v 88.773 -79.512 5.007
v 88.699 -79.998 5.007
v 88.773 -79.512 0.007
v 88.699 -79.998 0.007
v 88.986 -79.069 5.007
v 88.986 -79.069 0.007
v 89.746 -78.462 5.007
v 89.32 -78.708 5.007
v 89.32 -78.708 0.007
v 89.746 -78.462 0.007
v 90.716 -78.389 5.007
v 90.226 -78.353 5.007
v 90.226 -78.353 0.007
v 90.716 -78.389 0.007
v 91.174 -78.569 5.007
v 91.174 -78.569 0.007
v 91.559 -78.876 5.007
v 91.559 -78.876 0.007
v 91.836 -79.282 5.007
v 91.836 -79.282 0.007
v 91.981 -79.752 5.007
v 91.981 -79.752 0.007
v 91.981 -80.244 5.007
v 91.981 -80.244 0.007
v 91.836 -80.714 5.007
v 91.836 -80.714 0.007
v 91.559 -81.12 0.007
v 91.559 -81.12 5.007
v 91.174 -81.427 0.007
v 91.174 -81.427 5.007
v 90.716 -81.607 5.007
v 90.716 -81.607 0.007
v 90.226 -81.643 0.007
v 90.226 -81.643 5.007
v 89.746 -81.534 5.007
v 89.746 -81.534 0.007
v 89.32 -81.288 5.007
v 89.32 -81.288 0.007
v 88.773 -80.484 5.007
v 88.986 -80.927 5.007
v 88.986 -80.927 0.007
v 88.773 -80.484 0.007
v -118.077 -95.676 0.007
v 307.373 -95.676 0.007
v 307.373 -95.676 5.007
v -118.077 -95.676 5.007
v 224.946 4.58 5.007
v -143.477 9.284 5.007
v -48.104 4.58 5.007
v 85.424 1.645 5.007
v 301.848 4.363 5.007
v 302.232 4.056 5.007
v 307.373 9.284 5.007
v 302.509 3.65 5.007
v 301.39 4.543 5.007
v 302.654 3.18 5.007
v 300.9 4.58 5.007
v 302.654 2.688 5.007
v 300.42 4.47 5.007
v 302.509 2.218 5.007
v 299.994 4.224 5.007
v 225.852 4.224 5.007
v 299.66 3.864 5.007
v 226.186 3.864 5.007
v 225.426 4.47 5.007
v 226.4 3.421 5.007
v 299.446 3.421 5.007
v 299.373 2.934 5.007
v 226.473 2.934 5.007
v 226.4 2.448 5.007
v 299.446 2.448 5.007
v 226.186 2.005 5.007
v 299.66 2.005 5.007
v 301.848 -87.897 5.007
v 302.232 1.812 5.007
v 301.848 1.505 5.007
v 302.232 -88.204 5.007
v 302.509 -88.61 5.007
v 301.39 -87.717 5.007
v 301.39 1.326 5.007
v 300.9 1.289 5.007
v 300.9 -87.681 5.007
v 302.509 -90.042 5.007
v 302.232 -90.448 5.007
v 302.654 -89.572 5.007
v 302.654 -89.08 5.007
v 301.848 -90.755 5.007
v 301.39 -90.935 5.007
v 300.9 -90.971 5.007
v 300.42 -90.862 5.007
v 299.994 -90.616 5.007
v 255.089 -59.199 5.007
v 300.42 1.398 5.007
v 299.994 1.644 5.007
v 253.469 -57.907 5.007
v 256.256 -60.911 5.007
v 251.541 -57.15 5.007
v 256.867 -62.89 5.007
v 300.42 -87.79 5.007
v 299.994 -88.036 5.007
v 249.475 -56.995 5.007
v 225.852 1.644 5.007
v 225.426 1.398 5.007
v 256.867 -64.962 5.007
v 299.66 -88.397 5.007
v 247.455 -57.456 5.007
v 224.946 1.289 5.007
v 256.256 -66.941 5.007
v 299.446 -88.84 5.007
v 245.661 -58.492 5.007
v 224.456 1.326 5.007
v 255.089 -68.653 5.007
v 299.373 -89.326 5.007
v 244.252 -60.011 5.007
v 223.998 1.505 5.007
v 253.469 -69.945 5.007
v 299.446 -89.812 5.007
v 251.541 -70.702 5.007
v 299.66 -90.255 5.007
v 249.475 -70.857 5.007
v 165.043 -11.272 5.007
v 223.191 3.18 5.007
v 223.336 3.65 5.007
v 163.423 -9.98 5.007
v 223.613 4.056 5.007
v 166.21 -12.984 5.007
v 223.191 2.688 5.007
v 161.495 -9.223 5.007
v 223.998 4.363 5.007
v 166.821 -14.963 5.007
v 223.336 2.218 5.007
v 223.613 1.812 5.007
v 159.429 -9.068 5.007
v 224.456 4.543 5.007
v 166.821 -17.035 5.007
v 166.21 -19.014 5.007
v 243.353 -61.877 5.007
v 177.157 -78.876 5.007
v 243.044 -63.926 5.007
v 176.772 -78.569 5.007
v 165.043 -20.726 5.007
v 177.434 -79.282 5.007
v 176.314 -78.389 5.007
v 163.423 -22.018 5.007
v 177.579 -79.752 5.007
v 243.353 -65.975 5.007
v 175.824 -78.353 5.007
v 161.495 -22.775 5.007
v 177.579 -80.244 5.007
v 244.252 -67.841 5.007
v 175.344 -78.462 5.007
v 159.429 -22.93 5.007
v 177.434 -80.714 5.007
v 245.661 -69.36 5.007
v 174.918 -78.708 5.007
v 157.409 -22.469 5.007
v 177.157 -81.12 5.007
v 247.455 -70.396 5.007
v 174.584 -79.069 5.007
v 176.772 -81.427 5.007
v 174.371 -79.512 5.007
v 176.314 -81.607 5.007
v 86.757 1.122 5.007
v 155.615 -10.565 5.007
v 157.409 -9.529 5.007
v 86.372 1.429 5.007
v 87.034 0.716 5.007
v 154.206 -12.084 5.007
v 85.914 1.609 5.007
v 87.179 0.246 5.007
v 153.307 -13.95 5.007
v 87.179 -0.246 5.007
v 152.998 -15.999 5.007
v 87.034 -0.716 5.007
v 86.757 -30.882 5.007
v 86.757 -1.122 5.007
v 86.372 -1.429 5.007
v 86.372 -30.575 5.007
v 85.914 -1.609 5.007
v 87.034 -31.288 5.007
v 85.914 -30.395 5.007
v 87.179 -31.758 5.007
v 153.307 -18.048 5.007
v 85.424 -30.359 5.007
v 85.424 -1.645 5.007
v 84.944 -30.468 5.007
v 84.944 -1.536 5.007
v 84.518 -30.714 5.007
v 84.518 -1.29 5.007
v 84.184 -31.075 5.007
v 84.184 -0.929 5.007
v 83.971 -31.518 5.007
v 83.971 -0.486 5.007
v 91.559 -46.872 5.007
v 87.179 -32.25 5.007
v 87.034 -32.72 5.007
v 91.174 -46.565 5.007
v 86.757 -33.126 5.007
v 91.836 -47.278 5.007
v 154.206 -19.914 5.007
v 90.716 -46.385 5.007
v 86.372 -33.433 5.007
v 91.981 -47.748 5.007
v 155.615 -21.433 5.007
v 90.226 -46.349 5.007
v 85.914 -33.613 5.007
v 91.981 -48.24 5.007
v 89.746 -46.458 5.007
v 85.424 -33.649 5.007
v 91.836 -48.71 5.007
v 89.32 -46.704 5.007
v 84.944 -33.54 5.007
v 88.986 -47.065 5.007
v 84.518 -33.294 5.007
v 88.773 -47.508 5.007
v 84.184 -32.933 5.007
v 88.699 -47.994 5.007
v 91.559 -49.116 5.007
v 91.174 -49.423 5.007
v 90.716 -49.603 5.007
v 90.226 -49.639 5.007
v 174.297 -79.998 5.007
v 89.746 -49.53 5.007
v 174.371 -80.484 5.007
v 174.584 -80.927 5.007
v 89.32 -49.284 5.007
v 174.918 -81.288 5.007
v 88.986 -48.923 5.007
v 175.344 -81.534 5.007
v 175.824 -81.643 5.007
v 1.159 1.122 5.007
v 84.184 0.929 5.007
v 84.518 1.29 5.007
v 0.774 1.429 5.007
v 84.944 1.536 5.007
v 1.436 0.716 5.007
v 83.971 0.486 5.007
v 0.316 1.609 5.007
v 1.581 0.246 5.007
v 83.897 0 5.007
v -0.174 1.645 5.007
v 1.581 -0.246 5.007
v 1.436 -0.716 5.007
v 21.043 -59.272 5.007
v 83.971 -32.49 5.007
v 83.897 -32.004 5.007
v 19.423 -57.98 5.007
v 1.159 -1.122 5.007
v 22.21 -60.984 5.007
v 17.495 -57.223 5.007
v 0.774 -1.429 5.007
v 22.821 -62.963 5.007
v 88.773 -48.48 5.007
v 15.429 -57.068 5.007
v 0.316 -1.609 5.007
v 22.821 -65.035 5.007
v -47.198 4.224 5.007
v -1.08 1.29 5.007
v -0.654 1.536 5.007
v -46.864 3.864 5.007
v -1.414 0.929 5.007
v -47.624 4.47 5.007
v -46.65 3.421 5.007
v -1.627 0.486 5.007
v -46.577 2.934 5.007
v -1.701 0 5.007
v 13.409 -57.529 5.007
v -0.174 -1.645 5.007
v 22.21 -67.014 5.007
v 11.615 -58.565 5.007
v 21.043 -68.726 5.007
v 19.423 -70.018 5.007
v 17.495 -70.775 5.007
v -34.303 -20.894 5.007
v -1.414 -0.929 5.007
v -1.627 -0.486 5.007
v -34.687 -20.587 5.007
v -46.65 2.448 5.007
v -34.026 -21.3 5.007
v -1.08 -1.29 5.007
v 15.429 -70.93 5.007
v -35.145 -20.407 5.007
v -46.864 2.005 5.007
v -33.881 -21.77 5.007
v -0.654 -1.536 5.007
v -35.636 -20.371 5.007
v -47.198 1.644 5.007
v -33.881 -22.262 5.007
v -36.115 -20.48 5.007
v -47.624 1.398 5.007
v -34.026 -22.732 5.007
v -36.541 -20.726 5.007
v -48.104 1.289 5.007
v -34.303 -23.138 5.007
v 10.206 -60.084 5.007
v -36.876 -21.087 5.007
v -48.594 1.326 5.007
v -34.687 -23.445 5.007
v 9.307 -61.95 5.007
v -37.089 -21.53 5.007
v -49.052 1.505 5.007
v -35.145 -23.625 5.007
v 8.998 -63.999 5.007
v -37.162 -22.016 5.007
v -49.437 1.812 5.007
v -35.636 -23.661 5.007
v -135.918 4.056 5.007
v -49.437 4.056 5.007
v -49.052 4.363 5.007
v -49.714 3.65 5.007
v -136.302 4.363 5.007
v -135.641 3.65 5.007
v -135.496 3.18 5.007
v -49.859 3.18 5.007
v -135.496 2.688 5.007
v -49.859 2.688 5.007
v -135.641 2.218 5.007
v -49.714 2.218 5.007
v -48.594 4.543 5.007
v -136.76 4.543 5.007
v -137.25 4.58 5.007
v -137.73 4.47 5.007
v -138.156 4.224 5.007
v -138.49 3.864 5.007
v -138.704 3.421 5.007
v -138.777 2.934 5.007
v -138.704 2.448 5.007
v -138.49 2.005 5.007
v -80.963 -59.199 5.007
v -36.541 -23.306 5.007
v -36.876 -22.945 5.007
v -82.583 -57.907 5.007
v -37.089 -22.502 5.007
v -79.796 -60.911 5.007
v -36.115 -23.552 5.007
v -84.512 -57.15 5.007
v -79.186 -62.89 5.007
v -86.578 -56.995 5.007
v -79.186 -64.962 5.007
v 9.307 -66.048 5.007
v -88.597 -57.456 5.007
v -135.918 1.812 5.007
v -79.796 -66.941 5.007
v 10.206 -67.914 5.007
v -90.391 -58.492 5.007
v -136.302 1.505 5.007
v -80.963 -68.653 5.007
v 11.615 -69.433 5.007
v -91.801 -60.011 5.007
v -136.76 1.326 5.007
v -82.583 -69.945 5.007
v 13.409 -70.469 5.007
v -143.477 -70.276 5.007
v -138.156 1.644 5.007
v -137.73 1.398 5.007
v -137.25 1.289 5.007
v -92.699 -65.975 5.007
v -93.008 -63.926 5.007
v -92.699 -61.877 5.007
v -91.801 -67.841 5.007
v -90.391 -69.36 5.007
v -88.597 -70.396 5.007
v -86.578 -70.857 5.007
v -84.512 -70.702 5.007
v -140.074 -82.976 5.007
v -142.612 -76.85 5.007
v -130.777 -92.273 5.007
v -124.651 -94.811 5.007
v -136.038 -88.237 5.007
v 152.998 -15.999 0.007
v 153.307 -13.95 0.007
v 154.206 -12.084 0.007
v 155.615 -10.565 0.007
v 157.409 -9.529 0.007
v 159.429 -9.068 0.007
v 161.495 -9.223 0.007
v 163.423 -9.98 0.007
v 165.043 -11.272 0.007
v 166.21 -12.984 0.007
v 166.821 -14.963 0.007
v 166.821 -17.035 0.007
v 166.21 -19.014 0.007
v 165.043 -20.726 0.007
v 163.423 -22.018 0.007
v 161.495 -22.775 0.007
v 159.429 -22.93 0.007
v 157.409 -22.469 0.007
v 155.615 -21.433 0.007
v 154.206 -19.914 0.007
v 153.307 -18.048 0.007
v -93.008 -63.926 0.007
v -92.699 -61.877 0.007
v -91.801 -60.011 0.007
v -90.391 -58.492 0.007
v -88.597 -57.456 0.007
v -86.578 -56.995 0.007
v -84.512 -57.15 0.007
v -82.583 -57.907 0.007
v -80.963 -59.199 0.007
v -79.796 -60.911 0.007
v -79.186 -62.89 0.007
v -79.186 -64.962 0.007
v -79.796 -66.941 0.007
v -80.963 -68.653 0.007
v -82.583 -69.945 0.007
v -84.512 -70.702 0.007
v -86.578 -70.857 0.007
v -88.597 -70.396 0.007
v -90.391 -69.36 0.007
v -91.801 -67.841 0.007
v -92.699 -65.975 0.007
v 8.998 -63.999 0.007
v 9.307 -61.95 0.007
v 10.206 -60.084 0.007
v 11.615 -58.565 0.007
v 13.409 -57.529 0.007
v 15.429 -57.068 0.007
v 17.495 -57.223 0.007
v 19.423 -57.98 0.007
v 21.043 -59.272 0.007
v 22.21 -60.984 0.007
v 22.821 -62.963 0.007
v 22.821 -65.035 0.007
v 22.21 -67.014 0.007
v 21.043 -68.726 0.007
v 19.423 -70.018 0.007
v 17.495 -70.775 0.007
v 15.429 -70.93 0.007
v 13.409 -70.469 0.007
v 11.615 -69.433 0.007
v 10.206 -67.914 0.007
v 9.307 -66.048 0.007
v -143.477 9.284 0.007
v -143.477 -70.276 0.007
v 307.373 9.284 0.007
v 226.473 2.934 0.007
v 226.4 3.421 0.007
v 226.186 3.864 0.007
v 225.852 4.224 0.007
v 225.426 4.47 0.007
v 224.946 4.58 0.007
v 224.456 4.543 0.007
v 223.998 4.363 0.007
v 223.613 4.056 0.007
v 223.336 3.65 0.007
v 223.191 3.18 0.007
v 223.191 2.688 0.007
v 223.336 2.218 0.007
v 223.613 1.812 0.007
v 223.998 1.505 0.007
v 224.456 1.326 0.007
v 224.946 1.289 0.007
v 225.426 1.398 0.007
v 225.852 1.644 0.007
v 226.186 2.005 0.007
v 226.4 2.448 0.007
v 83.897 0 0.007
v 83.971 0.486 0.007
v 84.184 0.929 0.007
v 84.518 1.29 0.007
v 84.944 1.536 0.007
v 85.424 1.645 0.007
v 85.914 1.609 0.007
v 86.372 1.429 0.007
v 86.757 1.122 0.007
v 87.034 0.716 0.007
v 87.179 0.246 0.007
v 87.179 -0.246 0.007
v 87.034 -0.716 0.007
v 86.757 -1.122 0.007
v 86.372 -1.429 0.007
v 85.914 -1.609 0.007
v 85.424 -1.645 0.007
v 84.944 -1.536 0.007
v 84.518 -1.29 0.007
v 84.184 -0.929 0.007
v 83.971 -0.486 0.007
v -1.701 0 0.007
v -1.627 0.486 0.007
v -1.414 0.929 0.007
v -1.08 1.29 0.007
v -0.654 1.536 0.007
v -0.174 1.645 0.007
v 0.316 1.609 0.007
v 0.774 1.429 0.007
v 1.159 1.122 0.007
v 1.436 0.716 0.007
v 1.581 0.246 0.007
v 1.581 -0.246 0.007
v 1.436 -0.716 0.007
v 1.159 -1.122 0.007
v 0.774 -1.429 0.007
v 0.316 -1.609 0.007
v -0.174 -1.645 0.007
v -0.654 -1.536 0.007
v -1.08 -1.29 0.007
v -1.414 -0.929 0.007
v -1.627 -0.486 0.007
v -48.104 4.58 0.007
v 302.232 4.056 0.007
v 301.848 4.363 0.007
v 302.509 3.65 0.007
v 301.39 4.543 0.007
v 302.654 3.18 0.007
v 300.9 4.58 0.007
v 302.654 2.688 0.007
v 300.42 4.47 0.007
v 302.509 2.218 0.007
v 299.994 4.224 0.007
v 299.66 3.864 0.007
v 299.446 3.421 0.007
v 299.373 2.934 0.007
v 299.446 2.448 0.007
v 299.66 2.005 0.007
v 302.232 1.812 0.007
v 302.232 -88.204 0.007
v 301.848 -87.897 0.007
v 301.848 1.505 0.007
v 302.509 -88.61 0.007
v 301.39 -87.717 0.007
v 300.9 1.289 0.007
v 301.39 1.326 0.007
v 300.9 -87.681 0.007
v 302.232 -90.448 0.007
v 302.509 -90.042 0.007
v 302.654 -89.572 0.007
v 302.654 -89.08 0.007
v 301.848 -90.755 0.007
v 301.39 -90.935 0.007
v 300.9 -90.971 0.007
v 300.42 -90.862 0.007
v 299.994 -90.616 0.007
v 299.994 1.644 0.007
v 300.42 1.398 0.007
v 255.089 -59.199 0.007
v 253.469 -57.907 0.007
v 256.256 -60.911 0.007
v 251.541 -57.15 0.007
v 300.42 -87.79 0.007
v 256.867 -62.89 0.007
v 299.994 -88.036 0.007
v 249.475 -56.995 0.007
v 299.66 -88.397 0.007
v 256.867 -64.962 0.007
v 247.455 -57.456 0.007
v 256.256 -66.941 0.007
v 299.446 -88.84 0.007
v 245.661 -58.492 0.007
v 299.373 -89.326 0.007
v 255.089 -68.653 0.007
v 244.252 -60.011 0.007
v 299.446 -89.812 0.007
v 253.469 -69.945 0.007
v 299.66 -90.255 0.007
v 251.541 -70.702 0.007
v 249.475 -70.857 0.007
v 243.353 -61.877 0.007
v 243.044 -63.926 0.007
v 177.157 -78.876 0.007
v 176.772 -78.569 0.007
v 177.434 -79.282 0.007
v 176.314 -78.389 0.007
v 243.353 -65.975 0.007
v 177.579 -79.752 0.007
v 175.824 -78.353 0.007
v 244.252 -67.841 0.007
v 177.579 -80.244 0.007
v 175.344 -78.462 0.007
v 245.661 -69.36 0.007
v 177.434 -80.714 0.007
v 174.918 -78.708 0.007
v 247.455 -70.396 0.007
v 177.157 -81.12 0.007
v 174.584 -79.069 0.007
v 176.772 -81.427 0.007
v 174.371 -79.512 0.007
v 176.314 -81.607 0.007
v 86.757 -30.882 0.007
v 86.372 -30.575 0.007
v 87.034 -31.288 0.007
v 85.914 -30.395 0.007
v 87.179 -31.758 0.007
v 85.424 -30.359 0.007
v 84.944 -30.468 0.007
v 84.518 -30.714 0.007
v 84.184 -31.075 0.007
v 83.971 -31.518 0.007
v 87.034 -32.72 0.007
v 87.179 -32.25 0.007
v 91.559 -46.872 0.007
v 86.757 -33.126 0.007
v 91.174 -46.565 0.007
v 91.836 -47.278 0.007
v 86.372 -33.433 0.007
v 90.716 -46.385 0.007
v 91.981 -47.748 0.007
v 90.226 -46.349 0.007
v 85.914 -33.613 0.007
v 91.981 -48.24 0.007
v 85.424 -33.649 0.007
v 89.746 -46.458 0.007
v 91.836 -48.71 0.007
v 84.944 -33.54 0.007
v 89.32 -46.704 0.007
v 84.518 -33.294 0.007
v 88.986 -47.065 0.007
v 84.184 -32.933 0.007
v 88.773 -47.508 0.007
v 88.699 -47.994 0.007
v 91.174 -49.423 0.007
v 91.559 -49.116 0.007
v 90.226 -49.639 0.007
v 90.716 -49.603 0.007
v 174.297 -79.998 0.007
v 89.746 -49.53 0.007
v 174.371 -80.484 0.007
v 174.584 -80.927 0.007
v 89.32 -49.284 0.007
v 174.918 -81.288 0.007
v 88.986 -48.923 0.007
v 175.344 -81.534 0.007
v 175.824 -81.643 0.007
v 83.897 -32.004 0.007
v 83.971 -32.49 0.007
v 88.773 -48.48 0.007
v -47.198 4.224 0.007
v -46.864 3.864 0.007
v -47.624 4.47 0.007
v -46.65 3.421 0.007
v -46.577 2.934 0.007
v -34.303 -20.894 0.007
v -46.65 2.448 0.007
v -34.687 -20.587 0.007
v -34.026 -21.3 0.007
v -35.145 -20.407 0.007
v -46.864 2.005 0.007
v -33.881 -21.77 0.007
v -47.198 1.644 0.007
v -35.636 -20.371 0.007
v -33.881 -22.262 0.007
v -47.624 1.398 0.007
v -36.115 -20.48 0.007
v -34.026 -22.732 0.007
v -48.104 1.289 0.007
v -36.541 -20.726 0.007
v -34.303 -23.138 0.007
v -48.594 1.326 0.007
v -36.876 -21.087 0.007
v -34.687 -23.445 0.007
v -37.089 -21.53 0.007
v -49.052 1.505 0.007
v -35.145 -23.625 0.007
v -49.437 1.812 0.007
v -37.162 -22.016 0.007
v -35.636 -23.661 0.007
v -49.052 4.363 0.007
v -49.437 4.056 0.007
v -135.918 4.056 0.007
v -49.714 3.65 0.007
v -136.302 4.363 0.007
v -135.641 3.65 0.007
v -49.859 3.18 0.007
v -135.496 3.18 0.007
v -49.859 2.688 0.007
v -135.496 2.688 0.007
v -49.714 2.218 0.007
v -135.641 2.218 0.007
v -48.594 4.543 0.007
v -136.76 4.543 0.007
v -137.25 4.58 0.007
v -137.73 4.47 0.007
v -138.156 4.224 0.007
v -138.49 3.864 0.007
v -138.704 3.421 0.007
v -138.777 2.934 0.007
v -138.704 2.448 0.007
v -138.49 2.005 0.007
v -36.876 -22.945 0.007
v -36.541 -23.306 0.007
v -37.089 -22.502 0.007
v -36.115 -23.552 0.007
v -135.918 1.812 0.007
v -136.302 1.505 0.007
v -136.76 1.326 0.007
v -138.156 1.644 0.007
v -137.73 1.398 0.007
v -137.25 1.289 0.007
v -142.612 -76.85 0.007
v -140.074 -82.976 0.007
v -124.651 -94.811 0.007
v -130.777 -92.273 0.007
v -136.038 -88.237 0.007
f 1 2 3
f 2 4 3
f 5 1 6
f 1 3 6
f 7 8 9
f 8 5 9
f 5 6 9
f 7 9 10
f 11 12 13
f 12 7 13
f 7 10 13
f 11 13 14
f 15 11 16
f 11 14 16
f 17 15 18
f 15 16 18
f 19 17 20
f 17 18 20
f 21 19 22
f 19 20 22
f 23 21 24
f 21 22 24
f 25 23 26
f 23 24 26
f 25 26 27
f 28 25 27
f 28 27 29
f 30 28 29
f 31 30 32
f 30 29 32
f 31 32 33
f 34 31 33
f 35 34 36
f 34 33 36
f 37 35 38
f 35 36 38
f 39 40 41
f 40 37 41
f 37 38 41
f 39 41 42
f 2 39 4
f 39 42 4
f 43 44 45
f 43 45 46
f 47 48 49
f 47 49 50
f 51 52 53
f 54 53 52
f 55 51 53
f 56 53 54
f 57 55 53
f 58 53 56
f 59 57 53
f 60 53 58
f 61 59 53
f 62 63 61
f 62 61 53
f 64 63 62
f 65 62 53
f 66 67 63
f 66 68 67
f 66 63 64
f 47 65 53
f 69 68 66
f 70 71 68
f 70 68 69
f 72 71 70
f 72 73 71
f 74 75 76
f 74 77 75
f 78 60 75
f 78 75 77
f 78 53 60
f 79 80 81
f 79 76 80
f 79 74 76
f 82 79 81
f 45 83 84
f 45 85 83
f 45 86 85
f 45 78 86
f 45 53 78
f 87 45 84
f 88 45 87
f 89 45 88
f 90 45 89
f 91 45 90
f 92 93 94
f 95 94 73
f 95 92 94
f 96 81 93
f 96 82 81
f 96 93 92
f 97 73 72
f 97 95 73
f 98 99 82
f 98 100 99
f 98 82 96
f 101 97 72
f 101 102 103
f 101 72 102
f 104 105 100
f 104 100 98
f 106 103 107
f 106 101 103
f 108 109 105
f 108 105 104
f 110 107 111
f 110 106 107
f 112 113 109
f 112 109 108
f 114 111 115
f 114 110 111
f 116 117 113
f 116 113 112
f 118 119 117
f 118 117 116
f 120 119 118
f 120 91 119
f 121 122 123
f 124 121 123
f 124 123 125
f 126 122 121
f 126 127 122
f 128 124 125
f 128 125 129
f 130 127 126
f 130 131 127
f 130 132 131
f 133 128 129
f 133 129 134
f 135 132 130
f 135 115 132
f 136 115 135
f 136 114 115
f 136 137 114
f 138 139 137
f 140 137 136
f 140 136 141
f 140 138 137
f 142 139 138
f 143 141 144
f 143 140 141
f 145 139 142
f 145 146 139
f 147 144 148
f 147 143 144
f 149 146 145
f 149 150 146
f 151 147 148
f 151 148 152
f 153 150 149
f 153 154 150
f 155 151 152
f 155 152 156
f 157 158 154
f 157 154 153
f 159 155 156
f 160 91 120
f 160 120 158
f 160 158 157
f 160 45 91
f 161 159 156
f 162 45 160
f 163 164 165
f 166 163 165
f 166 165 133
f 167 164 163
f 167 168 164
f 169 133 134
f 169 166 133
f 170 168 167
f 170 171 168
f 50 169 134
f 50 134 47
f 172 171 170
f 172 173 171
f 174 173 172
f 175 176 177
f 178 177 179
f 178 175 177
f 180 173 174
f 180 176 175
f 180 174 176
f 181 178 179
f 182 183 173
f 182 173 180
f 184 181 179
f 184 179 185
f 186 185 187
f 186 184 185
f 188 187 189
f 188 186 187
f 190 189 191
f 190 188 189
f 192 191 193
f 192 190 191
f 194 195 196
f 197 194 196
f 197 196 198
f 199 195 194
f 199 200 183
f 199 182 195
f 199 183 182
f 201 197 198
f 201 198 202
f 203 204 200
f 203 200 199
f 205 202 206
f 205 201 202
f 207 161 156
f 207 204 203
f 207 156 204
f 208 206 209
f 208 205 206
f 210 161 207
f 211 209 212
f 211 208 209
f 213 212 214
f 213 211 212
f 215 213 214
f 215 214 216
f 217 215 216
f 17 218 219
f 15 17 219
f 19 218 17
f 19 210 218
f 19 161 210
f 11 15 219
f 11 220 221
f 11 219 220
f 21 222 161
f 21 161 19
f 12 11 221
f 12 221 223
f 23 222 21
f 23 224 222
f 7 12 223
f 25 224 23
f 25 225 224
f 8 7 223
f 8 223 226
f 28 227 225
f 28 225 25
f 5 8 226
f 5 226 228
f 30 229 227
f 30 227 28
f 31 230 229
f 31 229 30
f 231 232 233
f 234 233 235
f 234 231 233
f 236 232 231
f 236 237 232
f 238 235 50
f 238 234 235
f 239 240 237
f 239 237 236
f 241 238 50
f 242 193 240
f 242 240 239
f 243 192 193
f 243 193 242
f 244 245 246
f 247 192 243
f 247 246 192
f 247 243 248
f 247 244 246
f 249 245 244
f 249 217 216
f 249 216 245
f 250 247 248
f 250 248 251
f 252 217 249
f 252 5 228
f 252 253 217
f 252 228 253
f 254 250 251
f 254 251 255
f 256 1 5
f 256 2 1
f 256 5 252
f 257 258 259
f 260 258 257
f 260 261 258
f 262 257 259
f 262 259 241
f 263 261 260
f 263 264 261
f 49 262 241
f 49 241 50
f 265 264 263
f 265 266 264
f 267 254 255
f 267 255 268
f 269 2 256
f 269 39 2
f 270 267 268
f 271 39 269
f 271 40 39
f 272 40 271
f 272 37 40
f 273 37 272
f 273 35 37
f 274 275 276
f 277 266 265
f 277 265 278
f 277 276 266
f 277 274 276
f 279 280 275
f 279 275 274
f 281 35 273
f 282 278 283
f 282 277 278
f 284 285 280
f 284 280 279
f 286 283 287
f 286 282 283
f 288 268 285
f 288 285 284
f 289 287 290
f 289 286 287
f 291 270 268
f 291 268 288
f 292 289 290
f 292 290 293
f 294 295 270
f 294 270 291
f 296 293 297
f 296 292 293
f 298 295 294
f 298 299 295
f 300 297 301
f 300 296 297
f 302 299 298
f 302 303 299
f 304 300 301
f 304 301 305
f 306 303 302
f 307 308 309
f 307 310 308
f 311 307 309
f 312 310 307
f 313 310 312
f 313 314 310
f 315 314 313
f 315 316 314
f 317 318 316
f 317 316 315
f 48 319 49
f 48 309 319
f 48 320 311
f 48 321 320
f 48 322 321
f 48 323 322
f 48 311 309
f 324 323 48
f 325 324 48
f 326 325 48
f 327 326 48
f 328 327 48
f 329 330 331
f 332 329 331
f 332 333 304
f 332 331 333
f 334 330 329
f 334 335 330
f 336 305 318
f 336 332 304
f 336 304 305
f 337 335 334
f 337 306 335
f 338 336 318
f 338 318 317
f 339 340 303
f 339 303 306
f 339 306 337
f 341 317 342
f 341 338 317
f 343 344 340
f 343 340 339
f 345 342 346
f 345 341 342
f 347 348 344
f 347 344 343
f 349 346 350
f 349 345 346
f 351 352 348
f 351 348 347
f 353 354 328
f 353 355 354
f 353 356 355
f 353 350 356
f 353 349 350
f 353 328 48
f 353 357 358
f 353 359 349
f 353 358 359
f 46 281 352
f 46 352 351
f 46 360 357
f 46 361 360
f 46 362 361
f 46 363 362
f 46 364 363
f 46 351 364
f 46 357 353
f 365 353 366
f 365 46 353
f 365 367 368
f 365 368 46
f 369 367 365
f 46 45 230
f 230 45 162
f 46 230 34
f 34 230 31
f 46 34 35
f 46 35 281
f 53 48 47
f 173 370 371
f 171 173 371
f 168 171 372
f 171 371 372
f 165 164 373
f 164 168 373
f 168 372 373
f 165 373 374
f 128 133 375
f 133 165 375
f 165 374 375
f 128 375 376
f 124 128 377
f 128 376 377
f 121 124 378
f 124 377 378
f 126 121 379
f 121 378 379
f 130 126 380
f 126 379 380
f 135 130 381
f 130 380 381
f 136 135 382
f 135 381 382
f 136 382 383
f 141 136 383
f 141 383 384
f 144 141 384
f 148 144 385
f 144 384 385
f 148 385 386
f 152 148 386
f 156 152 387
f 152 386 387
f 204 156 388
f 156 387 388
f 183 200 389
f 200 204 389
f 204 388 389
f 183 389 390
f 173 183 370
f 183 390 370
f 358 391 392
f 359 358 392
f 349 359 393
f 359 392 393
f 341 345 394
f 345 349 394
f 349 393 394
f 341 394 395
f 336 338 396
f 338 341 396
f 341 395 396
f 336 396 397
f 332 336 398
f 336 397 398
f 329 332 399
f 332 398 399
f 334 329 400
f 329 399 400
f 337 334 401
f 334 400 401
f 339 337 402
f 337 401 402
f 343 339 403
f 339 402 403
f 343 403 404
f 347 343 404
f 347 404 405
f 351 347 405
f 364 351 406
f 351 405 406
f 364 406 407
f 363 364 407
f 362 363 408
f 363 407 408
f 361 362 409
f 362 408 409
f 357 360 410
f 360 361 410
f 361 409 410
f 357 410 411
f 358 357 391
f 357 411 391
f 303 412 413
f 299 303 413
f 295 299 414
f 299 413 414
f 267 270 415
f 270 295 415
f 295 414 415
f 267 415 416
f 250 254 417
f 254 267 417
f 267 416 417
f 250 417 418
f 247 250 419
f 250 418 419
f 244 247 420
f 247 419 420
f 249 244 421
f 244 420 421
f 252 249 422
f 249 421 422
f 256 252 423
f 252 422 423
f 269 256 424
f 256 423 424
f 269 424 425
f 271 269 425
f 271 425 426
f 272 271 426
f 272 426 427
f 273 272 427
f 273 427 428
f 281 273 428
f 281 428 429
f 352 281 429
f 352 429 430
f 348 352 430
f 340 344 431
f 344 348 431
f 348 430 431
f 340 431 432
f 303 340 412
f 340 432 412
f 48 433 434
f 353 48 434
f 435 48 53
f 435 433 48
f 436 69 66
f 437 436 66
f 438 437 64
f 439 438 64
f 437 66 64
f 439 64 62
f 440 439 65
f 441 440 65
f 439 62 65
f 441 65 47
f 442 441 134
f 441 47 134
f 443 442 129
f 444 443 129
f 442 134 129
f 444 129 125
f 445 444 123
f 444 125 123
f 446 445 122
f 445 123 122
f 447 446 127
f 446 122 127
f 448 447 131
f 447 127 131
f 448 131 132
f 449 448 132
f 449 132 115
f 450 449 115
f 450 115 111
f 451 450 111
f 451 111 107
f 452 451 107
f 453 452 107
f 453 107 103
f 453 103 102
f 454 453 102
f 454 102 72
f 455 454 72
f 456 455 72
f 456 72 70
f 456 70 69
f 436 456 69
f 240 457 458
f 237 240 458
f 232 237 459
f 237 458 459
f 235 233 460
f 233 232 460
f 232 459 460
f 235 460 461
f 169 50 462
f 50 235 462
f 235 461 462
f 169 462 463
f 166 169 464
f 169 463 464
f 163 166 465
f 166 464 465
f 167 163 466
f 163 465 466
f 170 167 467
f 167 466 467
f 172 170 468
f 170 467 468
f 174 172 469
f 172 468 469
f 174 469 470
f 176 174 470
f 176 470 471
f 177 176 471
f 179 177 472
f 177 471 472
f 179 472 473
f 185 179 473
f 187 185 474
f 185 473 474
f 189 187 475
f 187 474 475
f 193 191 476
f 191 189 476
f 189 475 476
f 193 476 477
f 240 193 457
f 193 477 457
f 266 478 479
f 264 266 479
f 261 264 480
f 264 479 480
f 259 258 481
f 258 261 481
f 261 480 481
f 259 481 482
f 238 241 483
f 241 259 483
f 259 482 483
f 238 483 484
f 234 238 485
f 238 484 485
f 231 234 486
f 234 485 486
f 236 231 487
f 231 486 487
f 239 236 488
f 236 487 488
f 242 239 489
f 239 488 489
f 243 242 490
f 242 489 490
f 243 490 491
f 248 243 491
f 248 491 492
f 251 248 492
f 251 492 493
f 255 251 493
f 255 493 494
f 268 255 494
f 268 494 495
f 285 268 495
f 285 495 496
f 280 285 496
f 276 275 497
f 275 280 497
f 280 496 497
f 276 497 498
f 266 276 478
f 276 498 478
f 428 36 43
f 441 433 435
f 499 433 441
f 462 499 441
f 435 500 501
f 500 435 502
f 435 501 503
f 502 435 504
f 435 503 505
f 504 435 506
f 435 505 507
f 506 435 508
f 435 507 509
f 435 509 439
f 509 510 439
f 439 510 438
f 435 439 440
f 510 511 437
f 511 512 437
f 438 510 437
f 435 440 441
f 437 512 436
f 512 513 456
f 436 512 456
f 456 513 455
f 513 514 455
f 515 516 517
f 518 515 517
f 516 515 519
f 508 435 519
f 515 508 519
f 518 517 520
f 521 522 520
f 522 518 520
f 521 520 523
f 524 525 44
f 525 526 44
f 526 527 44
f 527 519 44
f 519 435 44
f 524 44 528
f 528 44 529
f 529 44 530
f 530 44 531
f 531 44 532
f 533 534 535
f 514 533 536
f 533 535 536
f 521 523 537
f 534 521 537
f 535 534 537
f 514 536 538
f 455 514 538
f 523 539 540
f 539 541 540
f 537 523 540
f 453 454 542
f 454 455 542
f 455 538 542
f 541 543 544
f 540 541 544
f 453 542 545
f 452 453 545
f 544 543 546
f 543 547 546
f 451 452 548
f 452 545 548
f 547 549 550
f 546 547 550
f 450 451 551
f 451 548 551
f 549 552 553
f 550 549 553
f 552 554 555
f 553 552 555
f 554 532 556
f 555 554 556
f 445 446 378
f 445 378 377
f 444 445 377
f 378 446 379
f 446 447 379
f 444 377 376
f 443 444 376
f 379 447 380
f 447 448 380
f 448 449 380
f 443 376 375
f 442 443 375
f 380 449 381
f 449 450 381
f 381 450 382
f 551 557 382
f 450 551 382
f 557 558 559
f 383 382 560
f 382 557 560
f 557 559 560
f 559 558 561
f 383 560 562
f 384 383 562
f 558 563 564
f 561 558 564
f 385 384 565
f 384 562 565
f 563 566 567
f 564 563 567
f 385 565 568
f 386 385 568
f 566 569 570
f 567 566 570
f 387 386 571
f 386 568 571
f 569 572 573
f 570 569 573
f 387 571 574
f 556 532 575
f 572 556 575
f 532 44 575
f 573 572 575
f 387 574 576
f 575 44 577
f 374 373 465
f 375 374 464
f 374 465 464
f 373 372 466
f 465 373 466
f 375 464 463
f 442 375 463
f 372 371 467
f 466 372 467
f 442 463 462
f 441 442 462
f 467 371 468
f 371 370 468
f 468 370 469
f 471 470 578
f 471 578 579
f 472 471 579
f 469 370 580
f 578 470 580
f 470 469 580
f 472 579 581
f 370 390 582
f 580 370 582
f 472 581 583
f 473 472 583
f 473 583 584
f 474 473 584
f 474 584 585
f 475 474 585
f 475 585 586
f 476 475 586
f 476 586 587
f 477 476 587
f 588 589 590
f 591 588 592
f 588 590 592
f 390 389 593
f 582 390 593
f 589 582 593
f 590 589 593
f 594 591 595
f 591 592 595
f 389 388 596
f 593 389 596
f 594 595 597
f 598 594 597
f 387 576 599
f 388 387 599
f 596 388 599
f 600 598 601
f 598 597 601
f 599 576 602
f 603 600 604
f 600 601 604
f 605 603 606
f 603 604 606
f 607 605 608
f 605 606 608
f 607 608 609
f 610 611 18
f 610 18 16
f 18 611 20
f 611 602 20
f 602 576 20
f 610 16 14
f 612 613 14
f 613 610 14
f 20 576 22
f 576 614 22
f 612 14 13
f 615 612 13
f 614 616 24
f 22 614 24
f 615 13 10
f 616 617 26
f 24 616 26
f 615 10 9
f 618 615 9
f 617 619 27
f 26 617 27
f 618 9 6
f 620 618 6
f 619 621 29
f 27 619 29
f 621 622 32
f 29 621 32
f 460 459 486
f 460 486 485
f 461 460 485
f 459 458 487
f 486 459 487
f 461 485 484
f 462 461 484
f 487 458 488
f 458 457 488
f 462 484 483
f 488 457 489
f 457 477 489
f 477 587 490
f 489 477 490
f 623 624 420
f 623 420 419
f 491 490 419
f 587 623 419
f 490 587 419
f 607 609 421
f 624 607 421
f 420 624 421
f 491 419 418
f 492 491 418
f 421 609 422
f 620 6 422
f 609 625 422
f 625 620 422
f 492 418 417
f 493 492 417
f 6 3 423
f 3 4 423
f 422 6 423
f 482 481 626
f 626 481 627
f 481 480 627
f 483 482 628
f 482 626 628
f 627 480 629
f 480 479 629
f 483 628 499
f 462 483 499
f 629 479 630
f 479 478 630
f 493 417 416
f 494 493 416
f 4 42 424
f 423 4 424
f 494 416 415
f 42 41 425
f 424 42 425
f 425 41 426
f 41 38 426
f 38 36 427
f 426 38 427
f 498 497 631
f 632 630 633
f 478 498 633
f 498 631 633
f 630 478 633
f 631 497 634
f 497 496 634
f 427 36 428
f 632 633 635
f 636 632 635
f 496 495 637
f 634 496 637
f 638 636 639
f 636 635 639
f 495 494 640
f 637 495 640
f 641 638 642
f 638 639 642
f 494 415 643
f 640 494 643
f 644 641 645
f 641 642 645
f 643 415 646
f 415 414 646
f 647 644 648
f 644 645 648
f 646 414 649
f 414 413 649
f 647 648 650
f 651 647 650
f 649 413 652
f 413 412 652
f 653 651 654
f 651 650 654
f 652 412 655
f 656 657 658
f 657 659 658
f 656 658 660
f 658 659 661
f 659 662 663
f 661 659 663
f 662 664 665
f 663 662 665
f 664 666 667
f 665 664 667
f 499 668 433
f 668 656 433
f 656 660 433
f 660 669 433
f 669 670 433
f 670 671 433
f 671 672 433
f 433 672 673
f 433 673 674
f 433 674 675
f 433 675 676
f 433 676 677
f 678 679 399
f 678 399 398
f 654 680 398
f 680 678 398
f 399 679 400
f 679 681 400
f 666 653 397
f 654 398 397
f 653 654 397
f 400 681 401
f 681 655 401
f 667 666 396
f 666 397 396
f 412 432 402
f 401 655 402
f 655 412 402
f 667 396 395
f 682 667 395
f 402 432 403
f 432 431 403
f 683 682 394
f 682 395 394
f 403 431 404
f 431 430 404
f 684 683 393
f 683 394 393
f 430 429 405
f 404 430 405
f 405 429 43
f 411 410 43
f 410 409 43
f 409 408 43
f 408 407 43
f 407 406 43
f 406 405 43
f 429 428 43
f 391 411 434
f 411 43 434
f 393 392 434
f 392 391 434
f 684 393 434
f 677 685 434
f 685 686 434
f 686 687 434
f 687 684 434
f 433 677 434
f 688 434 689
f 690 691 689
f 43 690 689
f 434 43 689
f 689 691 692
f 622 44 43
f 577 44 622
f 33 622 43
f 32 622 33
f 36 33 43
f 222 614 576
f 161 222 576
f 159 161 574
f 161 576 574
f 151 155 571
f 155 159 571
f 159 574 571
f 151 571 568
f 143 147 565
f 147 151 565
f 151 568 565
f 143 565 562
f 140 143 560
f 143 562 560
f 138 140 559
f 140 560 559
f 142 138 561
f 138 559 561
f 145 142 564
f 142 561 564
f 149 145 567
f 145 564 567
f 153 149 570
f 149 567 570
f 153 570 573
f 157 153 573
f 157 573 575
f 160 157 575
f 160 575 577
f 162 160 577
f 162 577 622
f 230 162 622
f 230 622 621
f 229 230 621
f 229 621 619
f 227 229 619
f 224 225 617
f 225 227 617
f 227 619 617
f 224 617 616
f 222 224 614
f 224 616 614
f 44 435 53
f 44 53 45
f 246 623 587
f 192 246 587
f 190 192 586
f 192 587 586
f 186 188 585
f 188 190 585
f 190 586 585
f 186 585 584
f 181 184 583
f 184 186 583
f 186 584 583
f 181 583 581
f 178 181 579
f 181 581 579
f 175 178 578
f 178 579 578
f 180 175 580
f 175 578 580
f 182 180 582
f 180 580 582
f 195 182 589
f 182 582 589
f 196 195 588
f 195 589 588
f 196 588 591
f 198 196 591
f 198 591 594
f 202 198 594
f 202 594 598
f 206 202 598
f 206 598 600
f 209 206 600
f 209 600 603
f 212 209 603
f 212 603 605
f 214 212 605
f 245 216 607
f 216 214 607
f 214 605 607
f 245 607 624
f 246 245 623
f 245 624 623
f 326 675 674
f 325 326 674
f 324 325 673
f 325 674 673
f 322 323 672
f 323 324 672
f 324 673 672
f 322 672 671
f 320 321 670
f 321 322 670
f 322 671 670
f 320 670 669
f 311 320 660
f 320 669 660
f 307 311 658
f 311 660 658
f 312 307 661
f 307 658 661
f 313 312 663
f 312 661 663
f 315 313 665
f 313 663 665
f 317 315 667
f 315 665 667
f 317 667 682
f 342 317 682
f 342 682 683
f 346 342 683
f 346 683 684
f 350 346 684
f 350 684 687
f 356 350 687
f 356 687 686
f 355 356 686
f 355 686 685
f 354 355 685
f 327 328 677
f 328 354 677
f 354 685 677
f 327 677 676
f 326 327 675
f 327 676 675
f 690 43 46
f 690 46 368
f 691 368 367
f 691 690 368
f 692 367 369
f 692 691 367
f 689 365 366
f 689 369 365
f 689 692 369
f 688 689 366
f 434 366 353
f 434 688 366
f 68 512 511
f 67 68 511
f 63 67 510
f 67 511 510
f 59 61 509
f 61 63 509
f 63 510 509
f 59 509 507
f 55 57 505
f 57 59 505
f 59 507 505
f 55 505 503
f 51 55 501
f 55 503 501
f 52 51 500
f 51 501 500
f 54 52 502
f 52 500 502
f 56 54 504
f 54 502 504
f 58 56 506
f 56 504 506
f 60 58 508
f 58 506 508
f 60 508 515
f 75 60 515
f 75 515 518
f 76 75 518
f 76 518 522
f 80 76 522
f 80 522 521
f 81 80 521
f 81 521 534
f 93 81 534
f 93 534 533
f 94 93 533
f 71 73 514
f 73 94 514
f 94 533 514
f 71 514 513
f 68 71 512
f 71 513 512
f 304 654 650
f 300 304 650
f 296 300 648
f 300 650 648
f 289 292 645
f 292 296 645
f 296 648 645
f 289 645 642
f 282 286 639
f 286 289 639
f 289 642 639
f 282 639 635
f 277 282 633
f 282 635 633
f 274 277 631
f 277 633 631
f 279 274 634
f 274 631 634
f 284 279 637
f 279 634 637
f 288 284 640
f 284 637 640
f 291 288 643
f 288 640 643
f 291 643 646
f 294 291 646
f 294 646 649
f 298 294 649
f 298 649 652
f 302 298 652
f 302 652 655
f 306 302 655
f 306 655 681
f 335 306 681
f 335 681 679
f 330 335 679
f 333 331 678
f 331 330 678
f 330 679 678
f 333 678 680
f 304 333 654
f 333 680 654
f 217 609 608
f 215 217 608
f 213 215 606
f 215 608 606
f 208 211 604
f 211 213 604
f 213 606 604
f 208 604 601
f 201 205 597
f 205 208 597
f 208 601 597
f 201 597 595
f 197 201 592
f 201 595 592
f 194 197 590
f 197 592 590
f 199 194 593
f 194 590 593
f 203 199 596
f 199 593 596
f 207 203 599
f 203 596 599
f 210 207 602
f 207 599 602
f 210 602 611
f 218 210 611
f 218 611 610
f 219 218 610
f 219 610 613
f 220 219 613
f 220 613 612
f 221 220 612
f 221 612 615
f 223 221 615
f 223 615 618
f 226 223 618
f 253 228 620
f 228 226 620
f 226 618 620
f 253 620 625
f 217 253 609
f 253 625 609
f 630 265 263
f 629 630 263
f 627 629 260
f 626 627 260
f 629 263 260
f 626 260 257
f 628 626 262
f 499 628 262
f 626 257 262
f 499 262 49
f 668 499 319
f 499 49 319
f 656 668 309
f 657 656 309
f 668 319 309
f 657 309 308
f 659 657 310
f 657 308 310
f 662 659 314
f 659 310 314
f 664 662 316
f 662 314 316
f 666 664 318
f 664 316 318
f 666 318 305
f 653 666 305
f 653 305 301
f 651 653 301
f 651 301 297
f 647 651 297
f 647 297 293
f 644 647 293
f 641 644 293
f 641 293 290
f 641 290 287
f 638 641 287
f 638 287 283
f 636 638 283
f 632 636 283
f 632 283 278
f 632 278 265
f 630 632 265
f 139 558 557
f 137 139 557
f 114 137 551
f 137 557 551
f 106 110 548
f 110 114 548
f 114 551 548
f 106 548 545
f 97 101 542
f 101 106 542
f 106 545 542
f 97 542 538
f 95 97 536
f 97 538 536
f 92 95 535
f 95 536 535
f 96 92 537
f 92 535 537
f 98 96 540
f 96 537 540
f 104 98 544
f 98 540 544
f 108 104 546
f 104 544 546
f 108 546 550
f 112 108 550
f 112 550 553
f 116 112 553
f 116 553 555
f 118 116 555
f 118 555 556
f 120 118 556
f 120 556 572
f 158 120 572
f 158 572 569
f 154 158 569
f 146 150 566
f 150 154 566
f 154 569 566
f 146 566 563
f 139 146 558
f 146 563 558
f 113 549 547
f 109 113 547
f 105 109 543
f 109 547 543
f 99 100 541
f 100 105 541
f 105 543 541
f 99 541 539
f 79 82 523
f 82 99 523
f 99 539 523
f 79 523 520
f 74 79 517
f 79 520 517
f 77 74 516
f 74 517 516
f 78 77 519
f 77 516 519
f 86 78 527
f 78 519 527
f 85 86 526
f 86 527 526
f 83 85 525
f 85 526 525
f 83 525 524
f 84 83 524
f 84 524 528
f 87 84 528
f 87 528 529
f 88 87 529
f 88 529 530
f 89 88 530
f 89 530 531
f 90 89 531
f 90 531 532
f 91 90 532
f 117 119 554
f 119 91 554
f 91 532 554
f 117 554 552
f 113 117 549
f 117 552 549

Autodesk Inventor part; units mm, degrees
ref_plane "YZ Plane" through (0, 0, 0) normal (1, 0, 0) x (0, 1, 0)
ref_plane "XZ Plane" through (0, 0, 0) normal (0, 1, 0) x (-1, 0, 0)
ref_plane "XY Plane" through (0, 0, 0) normal (0, 0, 1) x (1, 0, 0)
ref_plane "Work Plane1" through (-137.1271, 2.9342, 0.007) normal (0, 0, 1) x (-1, 0, 0)
sketch "Sketch1" plane through (-137.1271, 2.9342, 0.007) normal (0, 0, 1) x (-1, 0, 0)
  line L0 (6.35, -6.35) -> (-444.5, -6.35) construction
  line L1 (-444.5, -6.35) -> (-444.5, 98.6102) construction
  line L2 (6.35, -6.35) -> (-444.5, -6.35)
  line L3 (-444.5, -6.35) -> (-444.5, 98.6102)
  line L4 (-444.5, 98.6102) -> (-19.05, 98.6102)
  circle A0 centre (0, 0) radius 1.7 construction
  circle A1 centre (-101.6148, 24.9502) radius 1.7 construction
  circle A2 centre (-222.6743, 2.9342) radius 1.9304 construction
  circle A3 centre (-222.6743, 34.9382) radius 1.9304 construction
  circle A4 centre (-227.4763, 50.9282) radius 1.9304 construction
  circle A5 centre (-227.4763, 82.9322) radius 1.9304 construction
  circle A6 centre (-313.0743, 82.9322) radius 1.9304 construction
  circle A7 centre (-137.0763, 2.9342) radius 1.9304 construction
  circle A8 centre (-438.15, 0) radius 1.7 construction
  circle A9 centre (-438.15, 92.2602) radius 1.7 construction
  circle A10 centre (-387.1214, 66.8602) radius 4.83 construction
  circle A11 centre (-51.0689, 66.8602) radius 5.2798 construction
  circle A12 centre (-153.0753, 66.9332) radius 4.15 construction
  circle A13 centre (-297.0753, 18.9332) radius 4.83 construction
  circle A14 centre (0, 0) radius 1.65
  circle A15 centre (-101.6148, 24.9502) radius 1.65
  circle A16 centre (-438.15, 0) radius 1.65
  circle A17 centre (-438.15, 92.2602) radius 1.65
  circle A18 centre (-137.0763, 2.9342) radius 1.65
  circle A19 centre (-222.6743, 2.9342) radius 1.65
  circle A20 centre (-222.6743, 34.9382) radius 1.65
  circle A21 centre (-227.4763, 50.9282) radius 1.65
  circle A22 centre (-227.4763, 82.9322) radius 1.65
  circle A23 centre (-313.0743, 82.9322) radius 1.65
  circle A24 centre (-51.0689, 66.8602) radius 6.95
  circle A25 centre (-153.0753, 66.9332) radius 6.95
  circle A26 centre (-297.0753, 18.9332) radius 6.95
  circle A27 centre (-387.1214, 66.8602) radius 6.95
  line L5 (6.35, -6.35) -> (6.35, 73.2102)
  arc A28 (6.35, 73.2102) -> (-19.05, 98.6102) centre (-19.05, 73.2102) ccw
  point P0 (-137.1271, 2.9342)
  point P1 (6.35, 98.6102)
  dimension "M3Clearance" = 3.3
  dimension "d1" = 3.3
  dimension "d2" = 3.3
  dimension "d3" = 3.3
  dimension "d4" = 3.3
  dimension "d5" = 3.3
  dimension "d6" = 3.3
  dimension "d7" = 3.3
  dimension "d8" = 3.3
  dimension "d9" = 3.3
  dimension "BearingHole" = 13.9
  dimension "d11" = 13.9
  dimension "d12" = 13.9
  dimension "d13" = 13.9
  dimension "d20" = 25.4
extrude "Extrusion1" add sketch "Sketch1" along normal blind 5
sketch "Sketch2" plane through (-137.1271, 2.9342, 5.007) normal (0, 0, 1) x (1, 0, 0)
  circle A0 centre (88.9, 0) radius 1.7 construction
  circle A1 centre (361.95, 0) radius 1.7 construction
  circle A2 centre (88.9, 0) radius 1.65
  circle A3 centre (361.95, 0) radius 1.65
  point P0 (137.1271, -2.9342)
  dimension "d16" = 3.3
  dimension "d17" = 3.3
extrude "Extrusion2" cut sketch "Sketch2" against normal through all
equation "\"d1\" = M3Clearance"
equation "\"d2\" = M3Clearance"
equation "\"d3\" = M3Clearance"
equation "\"d4\" = M3Clearance"
equation "\"d5\" = M3Clearance"
equation "\"d6\" = M3Clearance"
equation "\"d7\" = M3Clearance"
equation "\"d8\" = M3Clearance"
equation "\"d9\" = M3Clearance"
equation "\"d16\" = M3Clearance"
equation "\"d17\" = M3Clearance"
properties part number "outside wall 2"
